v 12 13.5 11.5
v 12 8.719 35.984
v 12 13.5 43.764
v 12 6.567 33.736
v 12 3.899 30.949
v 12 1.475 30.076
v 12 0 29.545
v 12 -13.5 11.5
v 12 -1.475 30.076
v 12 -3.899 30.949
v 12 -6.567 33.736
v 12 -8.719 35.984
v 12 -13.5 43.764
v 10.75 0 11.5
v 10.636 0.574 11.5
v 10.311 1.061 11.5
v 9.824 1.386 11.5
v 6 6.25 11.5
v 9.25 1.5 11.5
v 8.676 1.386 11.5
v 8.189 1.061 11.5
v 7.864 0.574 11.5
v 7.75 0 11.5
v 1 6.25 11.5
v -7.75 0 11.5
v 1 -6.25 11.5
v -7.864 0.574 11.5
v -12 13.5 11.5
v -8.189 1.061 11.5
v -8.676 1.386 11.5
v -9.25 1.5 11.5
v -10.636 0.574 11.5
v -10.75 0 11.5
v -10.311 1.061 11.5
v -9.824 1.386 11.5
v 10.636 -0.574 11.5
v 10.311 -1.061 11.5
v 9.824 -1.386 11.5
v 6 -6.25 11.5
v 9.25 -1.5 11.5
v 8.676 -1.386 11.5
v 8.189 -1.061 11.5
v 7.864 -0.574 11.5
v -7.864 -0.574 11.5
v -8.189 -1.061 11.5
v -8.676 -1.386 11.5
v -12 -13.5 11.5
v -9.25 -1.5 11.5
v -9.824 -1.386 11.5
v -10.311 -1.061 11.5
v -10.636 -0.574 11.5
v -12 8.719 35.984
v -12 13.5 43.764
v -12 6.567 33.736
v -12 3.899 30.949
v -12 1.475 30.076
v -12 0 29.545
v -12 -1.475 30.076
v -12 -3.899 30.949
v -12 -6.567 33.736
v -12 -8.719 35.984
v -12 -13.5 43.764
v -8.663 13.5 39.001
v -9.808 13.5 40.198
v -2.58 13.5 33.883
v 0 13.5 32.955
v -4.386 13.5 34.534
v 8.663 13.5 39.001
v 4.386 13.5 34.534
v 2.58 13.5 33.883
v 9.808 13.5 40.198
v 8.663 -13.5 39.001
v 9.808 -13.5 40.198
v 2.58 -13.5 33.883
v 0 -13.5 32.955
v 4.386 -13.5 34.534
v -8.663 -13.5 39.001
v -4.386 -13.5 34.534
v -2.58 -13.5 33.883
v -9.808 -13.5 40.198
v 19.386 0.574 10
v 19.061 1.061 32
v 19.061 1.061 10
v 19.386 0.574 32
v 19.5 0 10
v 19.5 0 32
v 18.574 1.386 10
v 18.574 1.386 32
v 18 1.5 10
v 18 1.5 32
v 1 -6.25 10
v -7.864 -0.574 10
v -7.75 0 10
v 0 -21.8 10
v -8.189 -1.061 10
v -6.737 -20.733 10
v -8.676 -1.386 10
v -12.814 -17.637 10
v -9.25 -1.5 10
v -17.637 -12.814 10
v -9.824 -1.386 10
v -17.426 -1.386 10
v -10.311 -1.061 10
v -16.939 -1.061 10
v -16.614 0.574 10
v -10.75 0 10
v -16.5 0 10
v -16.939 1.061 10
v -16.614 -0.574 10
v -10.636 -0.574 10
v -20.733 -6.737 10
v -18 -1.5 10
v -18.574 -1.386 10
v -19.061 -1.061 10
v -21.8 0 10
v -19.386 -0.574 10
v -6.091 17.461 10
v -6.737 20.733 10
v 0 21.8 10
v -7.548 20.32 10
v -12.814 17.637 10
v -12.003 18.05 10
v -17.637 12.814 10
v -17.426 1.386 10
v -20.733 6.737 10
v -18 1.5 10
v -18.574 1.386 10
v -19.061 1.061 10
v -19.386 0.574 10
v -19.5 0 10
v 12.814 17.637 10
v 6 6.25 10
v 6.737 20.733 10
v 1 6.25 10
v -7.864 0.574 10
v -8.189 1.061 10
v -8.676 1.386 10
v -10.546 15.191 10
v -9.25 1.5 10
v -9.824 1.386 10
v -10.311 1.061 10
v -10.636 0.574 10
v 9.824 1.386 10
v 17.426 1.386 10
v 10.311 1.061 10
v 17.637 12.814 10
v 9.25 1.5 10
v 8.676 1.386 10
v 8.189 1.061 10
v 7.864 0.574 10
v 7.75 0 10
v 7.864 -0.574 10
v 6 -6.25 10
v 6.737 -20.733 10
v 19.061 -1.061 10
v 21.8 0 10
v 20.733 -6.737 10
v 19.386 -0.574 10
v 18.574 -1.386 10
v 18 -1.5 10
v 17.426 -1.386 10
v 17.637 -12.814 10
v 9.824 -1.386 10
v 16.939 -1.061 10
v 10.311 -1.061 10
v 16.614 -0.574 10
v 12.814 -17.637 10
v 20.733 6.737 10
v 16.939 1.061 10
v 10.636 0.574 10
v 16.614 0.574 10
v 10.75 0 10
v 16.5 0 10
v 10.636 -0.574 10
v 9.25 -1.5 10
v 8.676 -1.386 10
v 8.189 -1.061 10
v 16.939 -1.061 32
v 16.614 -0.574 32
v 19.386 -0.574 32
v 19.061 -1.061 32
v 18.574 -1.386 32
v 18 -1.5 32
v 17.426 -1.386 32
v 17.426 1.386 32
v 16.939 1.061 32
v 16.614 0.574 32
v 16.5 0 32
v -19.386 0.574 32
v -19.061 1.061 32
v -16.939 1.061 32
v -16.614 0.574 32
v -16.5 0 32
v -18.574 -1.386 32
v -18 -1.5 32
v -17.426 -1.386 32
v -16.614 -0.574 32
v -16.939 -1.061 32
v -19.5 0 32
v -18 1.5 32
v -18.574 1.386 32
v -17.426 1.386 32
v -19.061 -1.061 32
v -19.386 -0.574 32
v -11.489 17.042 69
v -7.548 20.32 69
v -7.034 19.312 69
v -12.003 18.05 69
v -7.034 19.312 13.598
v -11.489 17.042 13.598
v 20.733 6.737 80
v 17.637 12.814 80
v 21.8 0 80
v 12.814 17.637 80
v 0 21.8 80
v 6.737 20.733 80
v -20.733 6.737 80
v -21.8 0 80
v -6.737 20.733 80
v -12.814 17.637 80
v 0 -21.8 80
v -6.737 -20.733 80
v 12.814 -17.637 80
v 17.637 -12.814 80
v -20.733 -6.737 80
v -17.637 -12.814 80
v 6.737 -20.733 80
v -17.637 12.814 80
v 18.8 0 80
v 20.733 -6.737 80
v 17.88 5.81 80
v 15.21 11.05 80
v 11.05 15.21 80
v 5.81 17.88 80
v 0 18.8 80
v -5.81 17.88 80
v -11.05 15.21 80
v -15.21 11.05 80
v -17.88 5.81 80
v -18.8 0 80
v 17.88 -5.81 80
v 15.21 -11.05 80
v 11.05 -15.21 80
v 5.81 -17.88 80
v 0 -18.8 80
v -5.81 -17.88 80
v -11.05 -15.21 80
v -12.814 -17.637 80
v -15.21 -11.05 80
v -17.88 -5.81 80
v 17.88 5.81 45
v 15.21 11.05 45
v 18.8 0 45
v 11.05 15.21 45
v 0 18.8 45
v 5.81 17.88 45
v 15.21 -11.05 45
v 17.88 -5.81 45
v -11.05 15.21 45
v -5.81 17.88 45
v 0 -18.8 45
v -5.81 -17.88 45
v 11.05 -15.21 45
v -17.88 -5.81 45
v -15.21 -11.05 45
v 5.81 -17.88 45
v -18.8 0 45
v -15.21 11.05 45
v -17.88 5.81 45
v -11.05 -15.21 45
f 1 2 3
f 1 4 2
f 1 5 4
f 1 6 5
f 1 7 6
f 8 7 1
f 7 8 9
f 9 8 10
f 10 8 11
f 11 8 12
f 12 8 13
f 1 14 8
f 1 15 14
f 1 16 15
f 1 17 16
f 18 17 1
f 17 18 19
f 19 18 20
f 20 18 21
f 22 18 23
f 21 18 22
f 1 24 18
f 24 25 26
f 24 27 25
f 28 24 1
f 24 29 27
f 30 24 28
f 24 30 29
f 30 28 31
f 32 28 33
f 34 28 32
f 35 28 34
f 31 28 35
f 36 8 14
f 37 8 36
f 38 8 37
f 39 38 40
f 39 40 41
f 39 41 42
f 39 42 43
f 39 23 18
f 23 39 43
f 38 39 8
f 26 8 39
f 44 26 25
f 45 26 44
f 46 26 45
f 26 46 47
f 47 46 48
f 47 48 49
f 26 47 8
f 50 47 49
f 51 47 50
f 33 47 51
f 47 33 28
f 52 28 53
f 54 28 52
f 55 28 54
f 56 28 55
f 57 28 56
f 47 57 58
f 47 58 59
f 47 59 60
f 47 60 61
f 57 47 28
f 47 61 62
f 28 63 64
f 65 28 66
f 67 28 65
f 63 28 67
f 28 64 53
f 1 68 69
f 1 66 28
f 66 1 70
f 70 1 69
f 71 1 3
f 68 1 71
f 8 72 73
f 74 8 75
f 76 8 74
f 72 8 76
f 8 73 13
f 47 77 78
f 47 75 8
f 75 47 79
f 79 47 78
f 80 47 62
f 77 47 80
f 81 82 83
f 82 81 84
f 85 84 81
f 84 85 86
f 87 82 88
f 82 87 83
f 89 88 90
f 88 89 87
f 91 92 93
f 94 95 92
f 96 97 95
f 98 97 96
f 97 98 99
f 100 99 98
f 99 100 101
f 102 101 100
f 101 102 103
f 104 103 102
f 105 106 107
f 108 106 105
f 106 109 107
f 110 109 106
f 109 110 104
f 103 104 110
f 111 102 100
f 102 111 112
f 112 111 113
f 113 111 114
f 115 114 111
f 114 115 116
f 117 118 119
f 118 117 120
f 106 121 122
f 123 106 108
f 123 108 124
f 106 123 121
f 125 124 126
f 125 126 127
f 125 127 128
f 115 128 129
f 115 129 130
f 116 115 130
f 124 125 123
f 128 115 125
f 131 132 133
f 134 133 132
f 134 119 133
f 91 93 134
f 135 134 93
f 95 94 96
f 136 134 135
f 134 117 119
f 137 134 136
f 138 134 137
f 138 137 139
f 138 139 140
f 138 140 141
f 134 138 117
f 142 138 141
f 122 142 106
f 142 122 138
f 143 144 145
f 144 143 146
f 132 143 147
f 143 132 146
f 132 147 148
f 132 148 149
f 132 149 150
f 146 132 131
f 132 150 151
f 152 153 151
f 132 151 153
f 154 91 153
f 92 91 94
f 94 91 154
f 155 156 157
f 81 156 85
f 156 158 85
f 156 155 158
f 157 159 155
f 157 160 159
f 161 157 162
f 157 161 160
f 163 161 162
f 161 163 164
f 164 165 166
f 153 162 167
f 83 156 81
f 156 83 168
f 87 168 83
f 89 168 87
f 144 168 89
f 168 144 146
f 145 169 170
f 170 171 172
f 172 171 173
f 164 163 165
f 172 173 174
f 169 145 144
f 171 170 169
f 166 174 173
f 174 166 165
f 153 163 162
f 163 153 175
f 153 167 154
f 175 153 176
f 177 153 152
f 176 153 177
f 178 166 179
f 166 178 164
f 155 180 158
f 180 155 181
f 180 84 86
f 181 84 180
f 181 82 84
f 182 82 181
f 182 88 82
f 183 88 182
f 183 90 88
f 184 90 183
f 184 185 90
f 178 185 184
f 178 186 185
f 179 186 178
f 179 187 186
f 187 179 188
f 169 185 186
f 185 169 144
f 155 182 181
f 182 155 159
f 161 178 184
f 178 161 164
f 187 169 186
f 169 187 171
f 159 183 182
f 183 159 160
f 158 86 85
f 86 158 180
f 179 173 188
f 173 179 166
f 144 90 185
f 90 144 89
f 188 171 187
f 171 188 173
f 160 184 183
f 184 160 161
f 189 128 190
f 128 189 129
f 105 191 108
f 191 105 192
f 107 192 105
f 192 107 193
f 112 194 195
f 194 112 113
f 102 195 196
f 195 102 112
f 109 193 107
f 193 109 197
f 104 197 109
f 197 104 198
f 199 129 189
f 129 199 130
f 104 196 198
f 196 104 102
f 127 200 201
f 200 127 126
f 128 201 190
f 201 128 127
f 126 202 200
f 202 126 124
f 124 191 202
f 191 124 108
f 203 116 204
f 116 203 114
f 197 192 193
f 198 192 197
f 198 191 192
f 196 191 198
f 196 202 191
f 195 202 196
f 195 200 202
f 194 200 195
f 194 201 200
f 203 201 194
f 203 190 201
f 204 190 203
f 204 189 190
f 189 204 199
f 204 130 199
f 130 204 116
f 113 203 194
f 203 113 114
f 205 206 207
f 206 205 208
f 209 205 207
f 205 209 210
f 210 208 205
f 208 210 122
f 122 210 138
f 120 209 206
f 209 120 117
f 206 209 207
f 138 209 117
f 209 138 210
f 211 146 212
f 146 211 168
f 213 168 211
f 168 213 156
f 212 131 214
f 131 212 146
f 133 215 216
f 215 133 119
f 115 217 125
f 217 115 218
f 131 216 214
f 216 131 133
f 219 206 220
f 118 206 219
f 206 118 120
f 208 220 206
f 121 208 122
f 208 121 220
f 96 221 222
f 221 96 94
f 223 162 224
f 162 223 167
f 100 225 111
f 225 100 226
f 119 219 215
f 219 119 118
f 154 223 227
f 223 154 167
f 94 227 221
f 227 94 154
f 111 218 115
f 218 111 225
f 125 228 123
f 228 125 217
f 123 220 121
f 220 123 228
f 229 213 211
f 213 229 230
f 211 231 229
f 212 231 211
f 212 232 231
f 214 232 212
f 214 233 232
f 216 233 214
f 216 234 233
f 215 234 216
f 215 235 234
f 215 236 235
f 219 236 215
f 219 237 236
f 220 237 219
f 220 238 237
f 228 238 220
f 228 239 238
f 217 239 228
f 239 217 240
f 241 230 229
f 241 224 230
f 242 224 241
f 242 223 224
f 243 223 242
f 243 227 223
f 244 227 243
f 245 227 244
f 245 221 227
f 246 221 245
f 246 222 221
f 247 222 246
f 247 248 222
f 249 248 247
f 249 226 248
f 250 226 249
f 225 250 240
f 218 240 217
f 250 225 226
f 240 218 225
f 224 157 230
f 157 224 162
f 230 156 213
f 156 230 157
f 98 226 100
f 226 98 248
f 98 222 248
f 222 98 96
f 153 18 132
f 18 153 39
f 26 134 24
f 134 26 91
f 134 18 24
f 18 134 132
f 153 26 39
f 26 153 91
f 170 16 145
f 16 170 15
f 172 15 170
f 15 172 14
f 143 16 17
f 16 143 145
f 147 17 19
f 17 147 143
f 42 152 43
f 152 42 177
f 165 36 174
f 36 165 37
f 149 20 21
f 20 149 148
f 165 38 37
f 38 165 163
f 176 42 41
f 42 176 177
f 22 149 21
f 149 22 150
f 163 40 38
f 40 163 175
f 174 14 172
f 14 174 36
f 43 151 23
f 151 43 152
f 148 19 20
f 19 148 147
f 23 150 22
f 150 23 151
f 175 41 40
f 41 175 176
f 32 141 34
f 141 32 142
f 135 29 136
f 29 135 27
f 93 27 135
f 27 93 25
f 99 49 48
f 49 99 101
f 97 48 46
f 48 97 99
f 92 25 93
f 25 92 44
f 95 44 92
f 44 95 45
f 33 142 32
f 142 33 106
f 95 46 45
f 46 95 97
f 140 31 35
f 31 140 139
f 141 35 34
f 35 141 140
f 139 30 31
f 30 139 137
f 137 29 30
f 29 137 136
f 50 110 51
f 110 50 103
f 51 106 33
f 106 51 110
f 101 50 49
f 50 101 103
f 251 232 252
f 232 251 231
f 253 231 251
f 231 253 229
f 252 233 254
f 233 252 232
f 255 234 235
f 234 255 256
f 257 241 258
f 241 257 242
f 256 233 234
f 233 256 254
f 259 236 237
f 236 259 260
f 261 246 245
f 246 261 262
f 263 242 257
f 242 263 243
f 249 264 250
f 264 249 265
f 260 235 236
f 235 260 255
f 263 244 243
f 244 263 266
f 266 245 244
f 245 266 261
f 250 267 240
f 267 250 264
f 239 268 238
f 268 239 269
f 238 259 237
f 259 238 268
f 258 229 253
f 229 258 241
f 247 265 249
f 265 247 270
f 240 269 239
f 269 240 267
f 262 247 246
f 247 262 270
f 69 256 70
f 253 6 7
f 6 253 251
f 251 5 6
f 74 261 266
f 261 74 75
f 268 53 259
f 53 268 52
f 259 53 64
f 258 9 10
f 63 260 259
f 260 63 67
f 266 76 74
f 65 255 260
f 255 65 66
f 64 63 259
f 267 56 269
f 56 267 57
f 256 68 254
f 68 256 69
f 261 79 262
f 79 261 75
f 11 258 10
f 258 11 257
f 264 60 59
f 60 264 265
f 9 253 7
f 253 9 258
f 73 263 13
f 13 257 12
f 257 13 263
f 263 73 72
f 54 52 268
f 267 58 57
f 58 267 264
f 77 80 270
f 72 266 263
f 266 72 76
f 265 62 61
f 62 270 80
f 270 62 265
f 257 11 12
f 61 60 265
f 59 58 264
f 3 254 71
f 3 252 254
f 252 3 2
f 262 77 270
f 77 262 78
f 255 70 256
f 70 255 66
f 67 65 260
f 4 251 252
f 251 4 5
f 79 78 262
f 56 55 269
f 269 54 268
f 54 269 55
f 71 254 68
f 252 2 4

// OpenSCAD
	radLED = 21.8;

module top()
{
	difference()
	{	
		translate([0,0,10])
		{
			cylinder(r=radLED, h=70, $fn=20);
		}

		translate([0,0,10])
		{
			translate([-24/2,-27/2,1.5])
				cube([24,27,61]);
			translate([18,0,0])
				cylinder(r=1.5, h=22,$fn=16);
			translate([-18,0,0])
				cylinder(r=1.5, h=22,$fn=16);
		}

		translate([1,-29/2, 2.5])
		{
			translate([0,29/2 - 12.5/2,1])
				cube([5,12.5,20]);		//usb
		}

		translate([18.5/2,0,0])
		{
			cylinder(r=1.5, h=12, $fn=16);
		}
		translate([-18.5/2,0,0])
		{
			cylinder(r=1.5, h=12, $fn=16);
		}


		rotate(117,[0,0,1])
			translate([0,-5/2,9])
			{
				translate([20.4,0,0])
				{
					cube([2,5,60]);
					translate([-1.5,0,-4])
						rotate(-60,[0,1,0])
							cube([20,5,3]);
				}
			}

		translate([0,0,45])
			cylinder(r=radLED-3, h=70, $fn=20);
		translate([0,0,25])
			cylinder(r1=10,r2=radLED-3, h=20, $fn=20);
	}
}

module middle()
{
	difference()
	{
		cylinder(r=radLED, h=10, $fn=20);	

		translate([1,-29/2, 2.5])
		{
			cube([1.8, 29, 7.5]);	//pcb
			translate([0,29/2 - 12.5/2,1])
				cube([5.2,12.5,20]);		//usb
			translate([-2,29/2 - 15/2, 4])
				cube([2,15,4]);
		}

		translate([18,0,0])
		{
			cylinder(r=1.65, h=22,$fn=16);
			cylinder(r=3.3, h=3);
		}
		translate([-18,0,0])
		{
			cylinder(r=1.65, h=22,$fn=16);
			cylinder(r=3.3, h=3);
		}

		cylinder(r=6,h=11);

		translate([18.5/2,0,0])
		{
			cylinder(r=1.5, h=11, $fn=16);
			cylinder(r1=1.7, r2=1.5, h=1.5, $fn=16);
			//translate([0,0,10-3])
			//	rotate(30, [0,0,1])
			//	cylinder(r=6.5/2, h=4, $fn=6);
		}
		translate([-18.5/2,0,0])
		{
			cylinder(r=1.5, h=11, $fn=16);
			cylinder(r1=1.7, r2=1.5, h=1.5, $fn=16);
			//translate([0,0,10-3])
			//	rotate(30, [0,0,1])
			//	cylinder(r=6.5/2, h=4, $fn=6);
		}
		rotate(117,[0,0,1])
			translate([0,-5/2,9])
			{
				cube([30,5,1]);
				translate([0,0,-8])
				rotate(-45,[0,1,0])
					cube([20,5,3]);

			}
	}
}

module bottom()
{
	difference()
	{
		union()
		{
			translate([0,0,-7])
			{
				cylinder(r=29/2, h=5);
				cylinder(r1=30.2/2, r2=29/2, h=1.5);
			}
			translate([0,0,-7-2])
			{
				cylinder(r=42/2, h=2);
			}
		}

		translate([0,0,-9])
			cylinder(r=6,h=9);

		translate([18.5/2,0,-9])
		{
			cylinder(r=1.65, h=9, $fn=16);
			cylinder(r=3.3, h=3);
			translate([0,0,3])
				cylinder(r1=3.3, r2=1.65, h=1);
		}
		translate([-18.5/2,0,-9])
		{
			cylinder(r=1.65, h=9, $fn=16);
			cylinder(r=3.3, h=3);
			translate([0,0,3])
				cylinder(r1=3.3, r2=1.65, h=1);
		}


		//pcb loch
		translate([18.5/2,-5.5,-9])
		{
			cylinder(r=1.6, h=9, $fn=16);
			translate([0,0,4])
				rotate(60, [0,0,1])
				cylinder(r=6.5/2, h=3, $fn=6);
		}

		//pcb loch
		translate([-18.5/2,-5.5,-9])
		{
			cylinder(r=1.6, h=9, $fn=16);
			translate([0,0,4])
				rotate(60, [0,0,1])
				cylinder(r=6.5/2, h=3, $fn=6);
		}


		translate([15,-4,-8])
			cube([7,8,1]);
		translate([-15-7,-4,-8])
			cube([7,8,1]);


		translate([-2.5, 0, -9])
			cube([5,25,1.25]);
	}
}

top();
//middle();
//bottom();
